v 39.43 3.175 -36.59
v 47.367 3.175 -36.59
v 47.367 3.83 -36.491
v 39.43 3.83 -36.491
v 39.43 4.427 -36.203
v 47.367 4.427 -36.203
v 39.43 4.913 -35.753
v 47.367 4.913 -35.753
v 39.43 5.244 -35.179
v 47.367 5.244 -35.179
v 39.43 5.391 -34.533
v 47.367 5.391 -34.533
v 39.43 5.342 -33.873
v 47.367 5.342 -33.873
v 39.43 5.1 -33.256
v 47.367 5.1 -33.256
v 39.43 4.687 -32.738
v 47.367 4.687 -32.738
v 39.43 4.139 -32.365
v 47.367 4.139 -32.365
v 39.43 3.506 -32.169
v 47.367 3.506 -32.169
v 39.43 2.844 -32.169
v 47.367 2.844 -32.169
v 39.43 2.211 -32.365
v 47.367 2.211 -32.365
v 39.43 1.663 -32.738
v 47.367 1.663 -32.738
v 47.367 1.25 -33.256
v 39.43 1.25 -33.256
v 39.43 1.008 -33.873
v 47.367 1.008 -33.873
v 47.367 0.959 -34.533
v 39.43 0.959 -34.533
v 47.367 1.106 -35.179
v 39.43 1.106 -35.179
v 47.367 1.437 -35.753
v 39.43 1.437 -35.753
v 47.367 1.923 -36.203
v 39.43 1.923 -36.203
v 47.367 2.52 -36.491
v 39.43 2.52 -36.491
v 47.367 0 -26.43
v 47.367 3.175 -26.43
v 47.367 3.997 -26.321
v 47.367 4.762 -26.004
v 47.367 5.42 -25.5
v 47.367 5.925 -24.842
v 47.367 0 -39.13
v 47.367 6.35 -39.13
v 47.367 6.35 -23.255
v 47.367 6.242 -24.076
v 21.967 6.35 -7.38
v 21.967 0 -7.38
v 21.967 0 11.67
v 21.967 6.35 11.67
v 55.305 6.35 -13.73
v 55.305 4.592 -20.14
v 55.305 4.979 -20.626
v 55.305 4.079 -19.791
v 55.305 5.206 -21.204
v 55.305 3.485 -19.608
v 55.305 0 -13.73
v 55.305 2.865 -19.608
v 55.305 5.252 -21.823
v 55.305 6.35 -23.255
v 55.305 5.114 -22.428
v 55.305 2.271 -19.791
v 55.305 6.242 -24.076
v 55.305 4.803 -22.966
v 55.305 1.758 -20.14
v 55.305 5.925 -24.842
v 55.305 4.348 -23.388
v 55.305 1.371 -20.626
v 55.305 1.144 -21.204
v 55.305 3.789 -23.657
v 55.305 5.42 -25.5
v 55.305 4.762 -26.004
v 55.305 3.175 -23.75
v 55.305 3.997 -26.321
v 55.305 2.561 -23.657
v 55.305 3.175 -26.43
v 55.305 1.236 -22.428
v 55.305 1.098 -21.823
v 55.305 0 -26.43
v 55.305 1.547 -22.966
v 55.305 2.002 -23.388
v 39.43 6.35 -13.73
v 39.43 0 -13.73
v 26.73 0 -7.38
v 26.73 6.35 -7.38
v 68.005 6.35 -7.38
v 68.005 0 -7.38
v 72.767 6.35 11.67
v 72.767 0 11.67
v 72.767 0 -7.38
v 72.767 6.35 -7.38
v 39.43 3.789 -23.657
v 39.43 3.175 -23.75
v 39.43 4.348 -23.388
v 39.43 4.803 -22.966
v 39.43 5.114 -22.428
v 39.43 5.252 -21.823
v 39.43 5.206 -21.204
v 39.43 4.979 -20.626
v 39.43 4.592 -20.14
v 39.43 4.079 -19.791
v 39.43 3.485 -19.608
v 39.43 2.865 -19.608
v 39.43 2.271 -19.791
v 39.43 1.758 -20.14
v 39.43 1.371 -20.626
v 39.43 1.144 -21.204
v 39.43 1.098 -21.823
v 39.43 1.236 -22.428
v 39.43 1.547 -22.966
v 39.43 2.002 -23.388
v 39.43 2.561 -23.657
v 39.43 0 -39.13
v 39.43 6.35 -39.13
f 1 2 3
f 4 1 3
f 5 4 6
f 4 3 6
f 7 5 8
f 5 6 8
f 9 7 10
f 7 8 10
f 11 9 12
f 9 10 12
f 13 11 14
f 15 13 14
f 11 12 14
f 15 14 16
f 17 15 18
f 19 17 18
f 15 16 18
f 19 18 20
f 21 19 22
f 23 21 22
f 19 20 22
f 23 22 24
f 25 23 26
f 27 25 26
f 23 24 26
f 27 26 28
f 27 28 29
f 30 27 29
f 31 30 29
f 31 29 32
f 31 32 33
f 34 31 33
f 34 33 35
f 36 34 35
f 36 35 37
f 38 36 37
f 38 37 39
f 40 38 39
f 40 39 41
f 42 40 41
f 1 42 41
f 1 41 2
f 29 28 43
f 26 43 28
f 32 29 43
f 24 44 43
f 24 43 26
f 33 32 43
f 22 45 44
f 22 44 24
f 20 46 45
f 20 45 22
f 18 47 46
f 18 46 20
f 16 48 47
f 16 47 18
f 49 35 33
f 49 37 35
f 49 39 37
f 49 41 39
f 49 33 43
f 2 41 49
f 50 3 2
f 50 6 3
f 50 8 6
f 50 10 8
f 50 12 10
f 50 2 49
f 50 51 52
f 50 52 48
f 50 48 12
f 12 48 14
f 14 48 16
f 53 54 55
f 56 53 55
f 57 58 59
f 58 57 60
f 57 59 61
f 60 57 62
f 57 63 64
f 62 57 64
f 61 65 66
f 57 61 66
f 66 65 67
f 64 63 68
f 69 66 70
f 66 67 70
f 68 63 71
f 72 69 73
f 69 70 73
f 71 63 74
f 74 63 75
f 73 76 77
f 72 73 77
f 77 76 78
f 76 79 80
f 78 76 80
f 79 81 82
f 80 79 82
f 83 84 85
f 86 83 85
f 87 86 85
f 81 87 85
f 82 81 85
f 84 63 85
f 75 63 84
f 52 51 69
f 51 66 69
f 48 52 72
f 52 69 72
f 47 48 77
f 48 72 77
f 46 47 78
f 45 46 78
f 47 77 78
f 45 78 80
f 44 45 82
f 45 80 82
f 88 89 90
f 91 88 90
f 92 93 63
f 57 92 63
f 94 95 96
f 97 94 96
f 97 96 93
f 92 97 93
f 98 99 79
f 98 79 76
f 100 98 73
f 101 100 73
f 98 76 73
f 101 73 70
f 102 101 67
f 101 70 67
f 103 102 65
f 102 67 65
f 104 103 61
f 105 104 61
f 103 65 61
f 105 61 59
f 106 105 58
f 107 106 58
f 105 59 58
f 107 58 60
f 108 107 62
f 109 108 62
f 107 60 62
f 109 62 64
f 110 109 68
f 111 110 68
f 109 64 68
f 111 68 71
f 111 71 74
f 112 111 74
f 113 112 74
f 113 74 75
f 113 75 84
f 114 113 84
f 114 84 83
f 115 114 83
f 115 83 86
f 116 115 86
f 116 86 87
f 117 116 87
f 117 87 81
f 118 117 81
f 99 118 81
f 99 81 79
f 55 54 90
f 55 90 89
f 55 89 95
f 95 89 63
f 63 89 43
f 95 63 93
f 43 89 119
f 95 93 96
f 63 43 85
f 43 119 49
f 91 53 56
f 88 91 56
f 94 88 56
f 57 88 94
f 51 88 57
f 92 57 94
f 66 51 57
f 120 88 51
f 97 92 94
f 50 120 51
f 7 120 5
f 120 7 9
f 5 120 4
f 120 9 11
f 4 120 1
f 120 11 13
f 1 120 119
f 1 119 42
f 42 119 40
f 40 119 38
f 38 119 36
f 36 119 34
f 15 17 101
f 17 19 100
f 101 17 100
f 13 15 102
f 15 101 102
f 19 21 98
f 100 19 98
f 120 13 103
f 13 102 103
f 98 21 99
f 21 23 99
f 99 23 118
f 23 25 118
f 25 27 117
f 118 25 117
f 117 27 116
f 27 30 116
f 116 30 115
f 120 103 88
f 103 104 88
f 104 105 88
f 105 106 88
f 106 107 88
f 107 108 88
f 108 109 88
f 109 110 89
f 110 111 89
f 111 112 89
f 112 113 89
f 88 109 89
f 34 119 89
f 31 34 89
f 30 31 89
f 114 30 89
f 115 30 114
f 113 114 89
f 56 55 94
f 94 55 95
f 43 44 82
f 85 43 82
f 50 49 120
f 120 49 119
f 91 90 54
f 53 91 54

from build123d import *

# Parameters (mm, degrees)
BOSS_EXTRUDE1_DEPTH = 6.35
SKETCH4_R           = 2.0828
SKETCH4_R_2         = 2.2225
CUT_EXTRUDE1_DEPTH  = 50.8
SKETCH5_W           = 7.9375
SKETCH5_H           = 12.7
CUT_EXTRUDE2_DEPTH  = 6.35
FILLET1_R           = 3.175


with BuildPart() as part:
    # Sketch3 → Boss-Extrude1 (new body)
    with BuildSketch(Plane(origin=(0, 0, 0), x_dir=(1, 0, 0), z_dir=(0, 1, 0))):
        Polygon((55.304809527, 7.379629834), (47.367309527, 7.379629834), (47.367309527, -11.670370166), (72.767309527, -11.670370166), (72.767309527, 7.379629834), (68.004809527, 7.379629834), align=None)
        Polygon((26.729809527, 7.379629834), (39.429809527, 7.379629834), (39.429809527, 13.729629834), align=None)
        Polygon((55.304809527, 13.729629834), (55.304809527, 7.379629834), (68.004809527, 7.379629834), align=None)
        Polygon((47.367309527, -11.670370166), (47.367309527, 7.379629834), (39.429809527, 7.379629834), (26.729809527, 7.379629834), (21.967309527, 7.379629834), (21.967309527, -11.670370166), align=None)
        Polygon((55.304809527, 39.129629834), (47.367309527, 39.129629834), (47.367309527, 7.379629834), (55.304809527, 7.379629834), (55.304809527, 13.729629834), align=None)
        Polygon((47.367309527, 7.379629834), (47.367309527, 39.129629834), (39.429809527, 39.129629834), (39.429809527, 13.729629834), (39.429809527, 7.379629834), align=None)
    extrude(amount=BOSS_EXTRUDE1_DEPTH)

    # Sketch4 → Cut-Extrude1 (cut)
    with BuildSketch(Plane(origin=(55.304809527, 0, 0), x_dir=(0, 0, -1), z_dir=(1, 0, 0))):
        with Locations((21.667129834, 3.175)):
            Circle(SKETCH4_R)
        with Locations((34.367129834, 3.175)):
            Circle(SKETCH4_R_2)
    extrude(amount=-CUT_EXTRUDE1_DEPTH, mode=Mode.SUBTRACT)

    # Sketch5 → Cut-Extrude2 (cut)
    with BuildSketch(Plane(origin=(0, 6.35, 0), x_dir=(1, 0, 0), z_dir=(0, 1, 0))):
        with Locations((51.336059527, 32.779629834)):
            Rectangle(SKETCH5_W, SKETCH5_H)
    extrude(amount=-CUT_EXTRUDE2_DEPTH, mode=Mode.SUBTRACT)

    # Fillet1
    fillet1_edges = [part.edges().sort_by_distance(p)[0] for p in [
        (51.336059527, 6.35, -26.429629834),
    ]]
    fillet(fillet1_edges, radius=FILLET1_R)


solid = part.part
